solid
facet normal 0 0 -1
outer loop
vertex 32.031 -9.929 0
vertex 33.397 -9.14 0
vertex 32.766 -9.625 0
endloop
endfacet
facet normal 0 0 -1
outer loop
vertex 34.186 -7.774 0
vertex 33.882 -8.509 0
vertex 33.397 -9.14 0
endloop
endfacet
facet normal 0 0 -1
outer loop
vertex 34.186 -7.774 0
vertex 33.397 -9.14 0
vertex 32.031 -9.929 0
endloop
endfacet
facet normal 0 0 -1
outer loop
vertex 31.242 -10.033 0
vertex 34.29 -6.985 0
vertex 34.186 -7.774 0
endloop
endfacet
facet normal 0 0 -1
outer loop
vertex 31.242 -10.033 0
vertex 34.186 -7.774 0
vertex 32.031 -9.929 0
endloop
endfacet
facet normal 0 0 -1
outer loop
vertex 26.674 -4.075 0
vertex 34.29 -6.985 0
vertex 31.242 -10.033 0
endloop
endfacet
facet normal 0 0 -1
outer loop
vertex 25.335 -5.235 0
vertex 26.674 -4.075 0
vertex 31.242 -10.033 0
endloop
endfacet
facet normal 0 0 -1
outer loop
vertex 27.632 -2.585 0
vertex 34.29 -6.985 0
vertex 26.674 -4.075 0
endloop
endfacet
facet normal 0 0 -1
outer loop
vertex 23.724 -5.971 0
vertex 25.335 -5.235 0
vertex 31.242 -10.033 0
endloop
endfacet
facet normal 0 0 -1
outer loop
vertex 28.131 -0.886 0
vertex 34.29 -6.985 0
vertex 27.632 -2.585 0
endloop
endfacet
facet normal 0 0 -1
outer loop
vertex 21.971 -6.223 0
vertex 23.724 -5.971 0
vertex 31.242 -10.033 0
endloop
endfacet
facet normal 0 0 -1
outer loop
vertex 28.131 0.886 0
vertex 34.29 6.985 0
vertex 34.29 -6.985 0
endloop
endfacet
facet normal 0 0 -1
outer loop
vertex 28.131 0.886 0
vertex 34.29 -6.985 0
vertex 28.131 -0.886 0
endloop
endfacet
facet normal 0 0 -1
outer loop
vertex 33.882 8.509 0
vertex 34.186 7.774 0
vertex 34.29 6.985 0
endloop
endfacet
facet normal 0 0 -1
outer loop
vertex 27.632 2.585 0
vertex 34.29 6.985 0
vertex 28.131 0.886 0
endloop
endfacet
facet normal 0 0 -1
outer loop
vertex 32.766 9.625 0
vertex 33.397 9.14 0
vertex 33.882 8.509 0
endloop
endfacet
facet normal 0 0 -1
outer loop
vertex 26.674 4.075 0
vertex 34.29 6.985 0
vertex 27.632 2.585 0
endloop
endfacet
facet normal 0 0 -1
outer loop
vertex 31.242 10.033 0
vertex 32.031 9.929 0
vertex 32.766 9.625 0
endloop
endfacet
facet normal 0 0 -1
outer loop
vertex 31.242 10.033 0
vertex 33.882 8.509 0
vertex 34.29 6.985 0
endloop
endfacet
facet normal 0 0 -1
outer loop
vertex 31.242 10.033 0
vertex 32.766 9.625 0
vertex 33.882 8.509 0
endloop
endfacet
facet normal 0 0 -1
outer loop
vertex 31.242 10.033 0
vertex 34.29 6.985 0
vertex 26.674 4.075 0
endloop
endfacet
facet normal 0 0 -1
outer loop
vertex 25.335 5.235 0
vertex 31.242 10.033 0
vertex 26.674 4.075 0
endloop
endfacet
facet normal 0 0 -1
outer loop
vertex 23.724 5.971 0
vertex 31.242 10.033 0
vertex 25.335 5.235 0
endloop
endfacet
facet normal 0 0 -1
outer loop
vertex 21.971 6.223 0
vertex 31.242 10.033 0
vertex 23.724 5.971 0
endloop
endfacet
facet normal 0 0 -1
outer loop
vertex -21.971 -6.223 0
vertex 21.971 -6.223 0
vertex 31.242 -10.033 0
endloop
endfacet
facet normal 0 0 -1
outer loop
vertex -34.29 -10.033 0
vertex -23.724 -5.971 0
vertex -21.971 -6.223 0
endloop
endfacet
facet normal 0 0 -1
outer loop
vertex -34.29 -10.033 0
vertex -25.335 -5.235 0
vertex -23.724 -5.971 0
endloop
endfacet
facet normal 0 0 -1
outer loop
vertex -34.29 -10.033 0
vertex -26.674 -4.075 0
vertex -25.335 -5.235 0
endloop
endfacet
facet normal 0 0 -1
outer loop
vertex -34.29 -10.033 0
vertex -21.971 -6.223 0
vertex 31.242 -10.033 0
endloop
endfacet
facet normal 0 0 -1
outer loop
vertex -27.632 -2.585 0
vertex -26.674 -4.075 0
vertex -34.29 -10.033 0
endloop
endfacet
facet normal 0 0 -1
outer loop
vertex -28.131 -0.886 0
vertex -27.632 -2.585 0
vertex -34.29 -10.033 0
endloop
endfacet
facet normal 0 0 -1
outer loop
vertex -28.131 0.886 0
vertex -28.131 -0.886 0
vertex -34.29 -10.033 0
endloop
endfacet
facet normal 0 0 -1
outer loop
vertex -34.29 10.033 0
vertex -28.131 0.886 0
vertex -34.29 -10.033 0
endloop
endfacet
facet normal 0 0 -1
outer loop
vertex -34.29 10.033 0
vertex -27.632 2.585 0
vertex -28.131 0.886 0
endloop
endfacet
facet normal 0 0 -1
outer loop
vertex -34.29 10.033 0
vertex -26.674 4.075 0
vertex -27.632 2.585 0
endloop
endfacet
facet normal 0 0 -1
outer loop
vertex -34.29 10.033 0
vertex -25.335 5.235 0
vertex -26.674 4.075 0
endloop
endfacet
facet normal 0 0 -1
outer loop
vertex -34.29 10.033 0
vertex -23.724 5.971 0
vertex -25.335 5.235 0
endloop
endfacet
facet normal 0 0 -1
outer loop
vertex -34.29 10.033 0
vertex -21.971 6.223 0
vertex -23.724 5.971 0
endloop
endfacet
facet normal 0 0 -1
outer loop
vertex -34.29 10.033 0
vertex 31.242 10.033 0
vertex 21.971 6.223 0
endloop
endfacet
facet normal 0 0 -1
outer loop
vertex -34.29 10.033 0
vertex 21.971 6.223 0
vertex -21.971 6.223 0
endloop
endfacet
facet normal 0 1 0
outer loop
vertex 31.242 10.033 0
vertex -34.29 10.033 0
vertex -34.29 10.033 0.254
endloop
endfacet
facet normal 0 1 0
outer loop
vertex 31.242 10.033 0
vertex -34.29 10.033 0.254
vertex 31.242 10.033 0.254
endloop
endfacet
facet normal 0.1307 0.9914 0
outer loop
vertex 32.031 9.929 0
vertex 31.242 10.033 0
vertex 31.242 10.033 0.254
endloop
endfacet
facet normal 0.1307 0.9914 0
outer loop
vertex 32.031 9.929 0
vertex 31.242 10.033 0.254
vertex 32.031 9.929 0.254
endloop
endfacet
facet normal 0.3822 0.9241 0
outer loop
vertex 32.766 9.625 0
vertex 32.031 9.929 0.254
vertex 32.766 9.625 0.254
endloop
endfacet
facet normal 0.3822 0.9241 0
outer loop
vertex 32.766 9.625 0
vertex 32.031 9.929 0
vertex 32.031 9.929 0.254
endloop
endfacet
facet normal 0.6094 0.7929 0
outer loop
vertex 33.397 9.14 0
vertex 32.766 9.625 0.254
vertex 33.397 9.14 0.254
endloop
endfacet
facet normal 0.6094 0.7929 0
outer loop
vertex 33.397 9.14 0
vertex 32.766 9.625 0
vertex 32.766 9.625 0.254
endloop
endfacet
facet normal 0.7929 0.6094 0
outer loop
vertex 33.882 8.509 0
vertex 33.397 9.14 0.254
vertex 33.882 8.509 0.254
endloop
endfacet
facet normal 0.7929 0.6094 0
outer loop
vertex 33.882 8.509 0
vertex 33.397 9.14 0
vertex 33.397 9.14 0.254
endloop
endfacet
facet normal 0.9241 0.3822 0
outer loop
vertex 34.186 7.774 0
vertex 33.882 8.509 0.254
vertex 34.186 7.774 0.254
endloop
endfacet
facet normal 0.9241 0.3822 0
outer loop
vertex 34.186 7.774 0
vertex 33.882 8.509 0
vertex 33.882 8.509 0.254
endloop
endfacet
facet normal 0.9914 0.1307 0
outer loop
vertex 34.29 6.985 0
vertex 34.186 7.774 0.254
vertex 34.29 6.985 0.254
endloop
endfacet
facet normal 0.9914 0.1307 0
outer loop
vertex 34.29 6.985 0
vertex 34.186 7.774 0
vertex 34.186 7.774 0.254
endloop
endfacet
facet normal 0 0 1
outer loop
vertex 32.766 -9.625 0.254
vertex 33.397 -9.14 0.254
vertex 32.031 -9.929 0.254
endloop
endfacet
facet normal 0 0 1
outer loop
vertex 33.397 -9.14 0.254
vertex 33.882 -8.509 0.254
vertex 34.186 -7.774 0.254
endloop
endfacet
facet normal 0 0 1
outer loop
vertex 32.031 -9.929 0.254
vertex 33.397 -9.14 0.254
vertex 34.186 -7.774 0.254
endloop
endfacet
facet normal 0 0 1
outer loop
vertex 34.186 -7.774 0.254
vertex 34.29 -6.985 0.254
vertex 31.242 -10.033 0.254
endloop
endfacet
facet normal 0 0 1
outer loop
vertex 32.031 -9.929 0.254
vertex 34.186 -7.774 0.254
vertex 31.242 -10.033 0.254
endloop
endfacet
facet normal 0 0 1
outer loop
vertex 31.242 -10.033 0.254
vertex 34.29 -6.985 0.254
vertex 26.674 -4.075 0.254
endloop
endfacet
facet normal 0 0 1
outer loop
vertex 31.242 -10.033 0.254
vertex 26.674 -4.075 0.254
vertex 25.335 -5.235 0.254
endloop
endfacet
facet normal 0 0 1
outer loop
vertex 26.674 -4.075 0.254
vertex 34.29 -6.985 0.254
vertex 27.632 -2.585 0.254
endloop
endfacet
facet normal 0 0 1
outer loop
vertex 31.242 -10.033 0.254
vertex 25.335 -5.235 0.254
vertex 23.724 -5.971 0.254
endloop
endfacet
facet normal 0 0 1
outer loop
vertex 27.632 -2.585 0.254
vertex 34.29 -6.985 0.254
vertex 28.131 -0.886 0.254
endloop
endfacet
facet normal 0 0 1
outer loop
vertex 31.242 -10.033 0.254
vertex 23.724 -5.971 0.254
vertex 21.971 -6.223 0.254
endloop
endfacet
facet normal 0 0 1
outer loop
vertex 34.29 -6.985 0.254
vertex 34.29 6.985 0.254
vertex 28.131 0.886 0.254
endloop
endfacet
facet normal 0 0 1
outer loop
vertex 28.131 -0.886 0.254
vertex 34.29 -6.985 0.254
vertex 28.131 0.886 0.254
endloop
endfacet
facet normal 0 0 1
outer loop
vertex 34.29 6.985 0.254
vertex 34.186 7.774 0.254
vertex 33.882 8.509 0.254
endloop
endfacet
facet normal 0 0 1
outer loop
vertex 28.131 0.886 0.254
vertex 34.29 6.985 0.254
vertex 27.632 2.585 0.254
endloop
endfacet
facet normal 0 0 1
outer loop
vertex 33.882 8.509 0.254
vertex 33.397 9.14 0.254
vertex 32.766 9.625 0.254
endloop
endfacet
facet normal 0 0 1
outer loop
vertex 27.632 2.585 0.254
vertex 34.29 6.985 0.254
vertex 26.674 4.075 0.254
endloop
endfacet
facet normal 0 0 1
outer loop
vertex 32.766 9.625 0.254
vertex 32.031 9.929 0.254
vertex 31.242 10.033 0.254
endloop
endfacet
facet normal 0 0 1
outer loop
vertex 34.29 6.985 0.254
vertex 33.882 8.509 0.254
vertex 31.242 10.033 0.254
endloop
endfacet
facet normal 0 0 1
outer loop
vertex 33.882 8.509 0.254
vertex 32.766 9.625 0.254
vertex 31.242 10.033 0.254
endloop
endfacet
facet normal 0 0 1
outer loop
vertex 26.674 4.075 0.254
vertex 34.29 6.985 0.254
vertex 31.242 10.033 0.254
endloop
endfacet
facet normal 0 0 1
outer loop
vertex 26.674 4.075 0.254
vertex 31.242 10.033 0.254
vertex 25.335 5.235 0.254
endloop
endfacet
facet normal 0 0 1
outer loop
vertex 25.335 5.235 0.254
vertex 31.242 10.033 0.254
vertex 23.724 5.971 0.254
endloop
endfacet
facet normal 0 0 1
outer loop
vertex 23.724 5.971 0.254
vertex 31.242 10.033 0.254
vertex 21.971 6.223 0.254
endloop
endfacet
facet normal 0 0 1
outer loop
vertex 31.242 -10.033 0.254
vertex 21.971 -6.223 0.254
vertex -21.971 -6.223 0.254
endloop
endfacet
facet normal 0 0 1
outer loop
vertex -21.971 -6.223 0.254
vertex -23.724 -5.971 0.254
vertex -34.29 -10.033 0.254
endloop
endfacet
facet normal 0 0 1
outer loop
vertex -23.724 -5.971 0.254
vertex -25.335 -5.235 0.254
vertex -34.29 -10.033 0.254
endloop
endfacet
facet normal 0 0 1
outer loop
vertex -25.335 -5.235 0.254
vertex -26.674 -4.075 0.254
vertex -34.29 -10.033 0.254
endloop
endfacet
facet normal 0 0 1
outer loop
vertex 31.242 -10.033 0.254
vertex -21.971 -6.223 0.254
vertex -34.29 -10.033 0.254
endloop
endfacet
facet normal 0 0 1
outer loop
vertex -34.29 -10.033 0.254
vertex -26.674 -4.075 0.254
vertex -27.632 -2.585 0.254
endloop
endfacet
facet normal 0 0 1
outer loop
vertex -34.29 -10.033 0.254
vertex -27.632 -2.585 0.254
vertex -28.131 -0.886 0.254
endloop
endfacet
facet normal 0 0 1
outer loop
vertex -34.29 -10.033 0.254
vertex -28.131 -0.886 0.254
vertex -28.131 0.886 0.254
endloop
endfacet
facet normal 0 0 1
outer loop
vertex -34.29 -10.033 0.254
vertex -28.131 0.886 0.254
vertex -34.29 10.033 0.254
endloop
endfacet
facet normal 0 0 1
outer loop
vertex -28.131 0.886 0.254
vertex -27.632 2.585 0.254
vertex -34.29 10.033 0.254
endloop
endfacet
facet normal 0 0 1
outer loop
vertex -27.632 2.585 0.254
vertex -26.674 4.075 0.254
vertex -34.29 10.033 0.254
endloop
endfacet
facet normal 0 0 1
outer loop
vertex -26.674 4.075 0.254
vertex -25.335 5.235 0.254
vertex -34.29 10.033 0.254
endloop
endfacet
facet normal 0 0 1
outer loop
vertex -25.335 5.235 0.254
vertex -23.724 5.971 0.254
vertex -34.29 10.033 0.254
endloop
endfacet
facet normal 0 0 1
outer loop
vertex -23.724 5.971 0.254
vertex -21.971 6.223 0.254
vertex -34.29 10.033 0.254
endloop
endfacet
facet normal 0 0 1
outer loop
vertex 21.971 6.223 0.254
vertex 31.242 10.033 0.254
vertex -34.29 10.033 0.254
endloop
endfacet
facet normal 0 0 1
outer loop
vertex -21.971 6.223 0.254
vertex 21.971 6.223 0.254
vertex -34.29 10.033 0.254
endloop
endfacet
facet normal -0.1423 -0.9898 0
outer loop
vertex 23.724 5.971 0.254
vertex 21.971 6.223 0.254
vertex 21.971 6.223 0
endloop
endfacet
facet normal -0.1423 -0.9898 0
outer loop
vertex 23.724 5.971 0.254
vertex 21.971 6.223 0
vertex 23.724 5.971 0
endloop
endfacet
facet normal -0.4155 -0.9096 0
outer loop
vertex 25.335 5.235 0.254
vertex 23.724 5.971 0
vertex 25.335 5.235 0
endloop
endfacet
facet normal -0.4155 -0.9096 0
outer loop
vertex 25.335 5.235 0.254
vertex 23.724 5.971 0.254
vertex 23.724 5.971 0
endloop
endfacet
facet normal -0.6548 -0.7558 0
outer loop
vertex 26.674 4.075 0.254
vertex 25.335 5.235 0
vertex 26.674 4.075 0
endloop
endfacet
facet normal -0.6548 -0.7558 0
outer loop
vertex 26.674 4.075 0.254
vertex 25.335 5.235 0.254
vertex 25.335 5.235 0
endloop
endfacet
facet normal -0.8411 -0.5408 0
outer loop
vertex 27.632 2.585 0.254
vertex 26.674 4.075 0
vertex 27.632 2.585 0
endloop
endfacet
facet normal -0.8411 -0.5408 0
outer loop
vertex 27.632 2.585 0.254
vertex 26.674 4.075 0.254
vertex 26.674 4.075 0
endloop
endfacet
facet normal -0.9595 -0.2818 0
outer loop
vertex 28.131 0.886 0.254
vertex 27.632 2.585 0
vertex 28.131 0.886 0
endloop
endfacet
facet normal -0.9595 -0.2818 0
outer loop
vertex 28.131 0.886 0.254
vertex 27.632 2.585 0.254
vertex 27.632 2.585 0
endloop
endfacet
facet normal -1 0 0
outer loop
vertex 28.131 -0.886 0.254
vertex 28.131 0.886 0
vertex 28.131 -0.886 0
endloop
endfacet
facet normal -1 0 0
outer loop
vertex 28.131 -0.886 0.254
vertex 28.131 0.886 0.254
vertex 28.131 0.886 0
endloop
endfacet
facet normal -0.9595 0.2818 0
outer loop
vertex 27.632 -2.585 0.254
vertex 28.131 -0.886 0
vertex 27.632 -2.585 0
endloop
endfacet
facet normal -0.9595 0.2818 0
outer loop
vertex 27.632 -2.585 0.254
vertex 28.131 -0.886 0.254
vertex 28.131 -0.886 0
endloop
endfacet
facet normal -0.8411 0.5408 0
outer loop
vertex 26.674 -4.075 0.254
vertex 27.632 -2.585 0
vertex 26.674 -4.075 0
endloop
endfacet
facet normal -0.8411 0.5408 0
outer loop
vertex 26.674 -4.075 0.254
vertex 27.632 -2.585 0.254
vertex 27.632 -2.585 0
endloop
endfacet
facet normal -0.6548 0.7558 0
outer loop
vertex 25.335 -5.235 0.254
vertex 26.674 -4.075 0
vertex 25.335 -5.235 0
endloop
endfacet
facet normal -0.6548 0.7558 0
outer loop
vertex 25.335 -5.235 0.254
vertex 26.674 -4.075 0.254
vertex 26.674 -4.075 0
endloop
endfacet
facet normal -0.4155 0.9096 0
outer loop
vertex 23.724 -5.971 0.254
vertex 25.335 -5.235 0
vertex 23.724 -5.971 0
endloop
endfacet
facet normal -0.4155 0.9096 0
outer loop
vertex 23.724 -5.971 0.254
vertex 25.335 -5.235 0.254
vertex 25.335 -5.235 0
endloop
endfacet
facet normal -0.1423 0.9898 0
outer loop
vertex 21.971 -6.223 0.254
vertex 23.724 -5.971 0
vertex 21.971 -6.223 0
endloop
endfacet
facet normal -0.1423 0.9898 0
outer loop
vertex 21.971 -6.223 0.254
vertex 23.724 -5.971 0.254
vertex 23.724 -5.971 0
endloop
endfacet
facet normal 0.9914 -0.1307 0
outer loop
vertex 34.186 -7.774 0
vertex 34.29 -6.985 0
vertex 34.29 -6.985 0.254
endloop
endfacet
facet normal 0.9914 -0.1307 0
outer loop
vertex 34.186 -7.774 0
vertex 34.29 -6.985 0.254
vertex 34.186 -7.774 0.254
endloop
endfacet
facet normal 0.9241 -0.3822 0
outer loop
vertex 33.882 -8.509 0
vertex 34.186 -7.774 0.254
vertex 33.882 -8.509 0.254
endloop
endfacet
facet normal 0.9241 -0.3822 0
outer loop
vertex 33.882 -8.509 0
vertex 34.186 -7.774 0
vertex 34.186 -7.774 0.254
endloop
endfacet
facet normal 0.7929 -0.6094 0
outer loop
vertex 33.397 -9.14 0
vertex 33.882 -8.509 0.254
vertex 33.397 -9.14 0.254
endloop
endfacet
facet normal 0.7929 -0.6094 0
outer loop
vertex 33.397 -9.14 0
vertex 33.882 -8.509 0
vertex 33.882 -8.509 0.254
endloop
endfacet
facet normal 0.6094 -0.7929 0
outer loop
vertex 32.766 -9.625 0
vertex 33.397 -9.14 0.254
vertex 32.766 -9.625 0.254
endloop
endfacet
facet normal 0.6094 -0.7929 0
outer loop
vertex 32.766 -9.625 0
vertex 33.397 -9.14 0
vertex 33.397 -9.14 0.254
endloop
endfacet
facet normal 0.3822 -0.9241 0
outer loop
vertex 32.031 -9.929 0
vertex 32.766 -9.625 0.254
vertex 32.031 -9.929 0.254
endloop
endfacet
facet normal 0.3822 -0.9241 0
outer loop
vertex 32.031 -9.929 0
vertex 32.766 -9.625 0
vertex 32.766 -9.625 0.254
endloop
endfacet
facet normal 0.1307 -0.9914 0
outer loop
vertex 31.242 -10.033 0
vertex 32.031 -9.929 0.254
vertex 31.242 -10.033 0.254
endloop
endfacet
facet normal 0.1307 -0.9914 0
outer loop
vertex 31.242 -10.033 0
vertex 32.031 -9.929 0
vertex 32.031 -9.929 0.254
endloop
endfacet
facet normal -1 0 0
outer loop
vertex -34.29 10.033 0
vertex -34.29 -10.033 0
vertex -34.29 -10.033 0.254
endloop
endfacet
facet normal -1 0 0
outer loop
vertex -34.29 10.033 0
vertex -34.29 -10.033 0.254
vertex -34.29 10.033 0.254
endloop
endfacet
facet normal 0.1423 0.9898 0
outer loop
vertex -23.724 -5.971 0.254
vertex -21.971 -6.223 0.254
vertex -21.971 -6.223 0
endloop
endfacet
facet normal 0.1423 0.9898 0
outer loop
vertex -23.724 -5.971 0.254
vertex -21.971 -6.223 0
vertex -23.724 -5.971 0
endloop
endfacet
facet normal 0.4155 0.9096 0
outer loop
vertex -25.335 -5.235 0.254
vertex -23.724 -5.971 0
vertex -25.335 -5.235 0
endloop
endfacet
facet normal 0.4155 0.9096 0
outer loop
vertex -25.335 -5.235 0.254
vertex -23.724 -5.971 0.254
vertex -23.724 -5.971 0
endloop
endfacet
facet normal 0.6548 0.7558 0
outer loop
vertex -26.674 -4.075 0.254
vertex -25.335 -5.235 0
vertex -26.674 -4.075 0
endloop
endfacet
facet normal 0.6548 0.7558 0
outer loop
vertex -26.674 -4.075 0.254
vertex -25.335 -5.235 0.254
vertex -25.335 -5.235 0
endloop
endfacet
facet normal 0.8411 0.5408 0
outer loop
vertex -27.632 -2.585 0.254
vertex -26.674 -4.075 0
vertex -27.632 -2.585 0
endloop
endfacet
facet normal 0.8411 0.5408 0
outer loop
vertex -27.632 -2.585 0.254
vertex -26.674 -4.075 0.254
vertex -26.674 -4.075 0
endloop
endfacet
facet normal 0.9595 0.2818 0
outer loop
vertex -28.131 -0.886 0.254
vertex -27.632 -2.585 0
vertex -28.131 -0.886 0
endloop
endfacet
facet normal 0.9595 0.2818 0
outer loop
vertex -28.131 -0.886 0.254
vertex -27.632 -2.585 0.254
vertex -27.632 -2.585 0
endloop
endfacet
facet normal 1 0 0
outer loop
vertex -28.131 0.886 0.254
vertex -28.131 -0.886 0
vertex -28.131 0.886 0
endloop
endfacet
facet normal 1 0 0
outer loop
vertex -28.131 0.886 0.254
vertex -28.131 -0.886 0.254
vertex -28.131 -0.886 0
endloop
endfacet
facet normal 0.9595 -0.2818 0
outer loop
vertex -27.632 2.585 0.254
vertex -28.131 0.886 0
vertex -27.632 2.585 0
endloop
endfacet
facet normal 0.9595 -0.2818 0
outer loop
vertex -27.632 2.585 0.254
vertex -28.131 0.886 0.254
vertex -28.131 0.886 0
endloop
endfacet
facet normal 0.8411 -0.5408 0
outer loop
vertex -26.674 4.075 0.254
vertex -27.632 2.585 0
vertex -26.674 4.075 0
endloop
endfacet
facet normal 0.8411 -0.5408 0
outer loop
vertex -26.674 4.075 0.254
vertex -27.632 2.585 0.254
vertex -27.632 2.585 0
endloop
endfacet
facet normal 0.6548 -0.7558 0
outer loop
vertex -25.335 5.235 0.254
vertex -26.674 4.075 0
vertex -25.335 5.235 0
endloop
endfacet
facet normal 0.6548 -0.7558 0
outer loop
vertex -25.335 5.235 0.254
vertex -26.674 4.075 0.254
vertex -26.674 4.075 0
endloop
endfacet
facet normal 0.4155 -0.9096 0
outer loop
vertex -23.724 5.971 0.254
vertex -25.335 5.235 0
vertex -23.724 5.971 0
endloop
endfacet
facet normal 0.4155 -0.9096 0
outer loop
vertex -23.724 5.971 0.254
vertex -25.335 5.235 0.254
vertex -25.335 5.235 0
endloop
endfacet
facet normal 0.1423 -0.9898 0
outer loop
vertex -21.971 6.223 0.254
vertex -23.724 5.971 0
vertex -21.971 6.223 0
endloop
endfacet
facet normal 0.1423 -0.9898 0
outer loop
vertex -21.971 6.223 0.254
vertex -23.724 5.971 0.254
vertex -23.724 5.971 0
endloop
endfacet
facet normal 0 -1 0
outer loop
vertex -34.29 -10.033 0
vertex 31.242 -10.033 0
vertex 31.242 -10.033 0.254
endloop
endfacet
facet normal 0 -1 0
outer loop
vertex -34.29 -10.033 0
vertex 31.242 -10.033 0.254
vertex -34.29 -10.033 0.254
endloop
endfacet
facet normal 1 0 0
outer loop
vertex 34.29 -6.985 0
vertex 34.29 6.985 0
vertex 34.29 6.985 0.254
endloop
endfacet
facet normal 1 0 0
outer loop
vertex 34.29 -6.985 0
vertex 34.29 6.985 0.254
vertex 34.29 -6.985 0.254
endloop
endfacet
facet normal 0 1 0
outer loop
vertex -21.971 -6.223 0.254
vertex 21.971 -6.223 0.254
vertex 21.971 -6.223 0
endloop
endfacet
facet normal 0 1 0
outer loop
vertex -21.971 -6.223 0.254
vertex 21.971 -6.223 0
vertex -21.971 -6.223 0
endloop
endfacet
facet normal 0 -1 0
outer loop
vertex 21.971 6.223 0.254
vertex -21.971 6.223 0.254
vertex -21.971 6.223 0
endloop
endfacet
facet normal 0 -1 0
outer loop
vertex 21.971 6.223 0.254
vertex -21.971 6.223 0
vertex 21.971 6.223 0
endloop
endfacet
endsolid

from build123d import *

# Parameters (mm, degrees)
BOSS_EXTRUDE1_DEPTH = 0.254
CUT_EXTRUDE1_DEPTH  = 0.254


with BuildPart() as part:
    # Sketch1 → Boss-Extrude1 (new body)
    with BuildSketch(Plane.XY):
        with BuildLine():
            Line((-34.29, 10.033), (31.242, 10.033))
            ThreePointArc((31.242, 10.033), (33.397261469, 9.140261469), (34.29, 6.985))
            Line((34.29, 6.985), (34.29, -6.985))
            ThreePointArc((34.29, -6.985), (33.397261469, -9.140261469), (31.242, -10.033))
            Line((31.242, -10.033), (-34.29, -10.033))
            Line((-34.29, -10.033), (-34.29, 10.033))
        make_face()
    extrude(amount=BOSS_EXTRUDE1_DEPTH)

    # Sketch2 → Cut-Extrude1 (cut)
    with BuildSketch(Plane.XY.offset(0.254)):
        with BuildLine():
            Line((-21.971, 6.223), (21.971, 6.223))
            ThreePointArc((21.971, 6.223), (28.194, 0), (21.971, -6.223))
            Line((21.971, -6.223), (-21.971, -6.223))
            ThreePointArc((-21.971, -6.223), (-28.194, 0), (-21.971, 6.223))
        make_face()
    extrude(amount=-CUT_EXTRUDE1_DEPTH, mode=Mode.SUBTRACT)


solid = part.part
